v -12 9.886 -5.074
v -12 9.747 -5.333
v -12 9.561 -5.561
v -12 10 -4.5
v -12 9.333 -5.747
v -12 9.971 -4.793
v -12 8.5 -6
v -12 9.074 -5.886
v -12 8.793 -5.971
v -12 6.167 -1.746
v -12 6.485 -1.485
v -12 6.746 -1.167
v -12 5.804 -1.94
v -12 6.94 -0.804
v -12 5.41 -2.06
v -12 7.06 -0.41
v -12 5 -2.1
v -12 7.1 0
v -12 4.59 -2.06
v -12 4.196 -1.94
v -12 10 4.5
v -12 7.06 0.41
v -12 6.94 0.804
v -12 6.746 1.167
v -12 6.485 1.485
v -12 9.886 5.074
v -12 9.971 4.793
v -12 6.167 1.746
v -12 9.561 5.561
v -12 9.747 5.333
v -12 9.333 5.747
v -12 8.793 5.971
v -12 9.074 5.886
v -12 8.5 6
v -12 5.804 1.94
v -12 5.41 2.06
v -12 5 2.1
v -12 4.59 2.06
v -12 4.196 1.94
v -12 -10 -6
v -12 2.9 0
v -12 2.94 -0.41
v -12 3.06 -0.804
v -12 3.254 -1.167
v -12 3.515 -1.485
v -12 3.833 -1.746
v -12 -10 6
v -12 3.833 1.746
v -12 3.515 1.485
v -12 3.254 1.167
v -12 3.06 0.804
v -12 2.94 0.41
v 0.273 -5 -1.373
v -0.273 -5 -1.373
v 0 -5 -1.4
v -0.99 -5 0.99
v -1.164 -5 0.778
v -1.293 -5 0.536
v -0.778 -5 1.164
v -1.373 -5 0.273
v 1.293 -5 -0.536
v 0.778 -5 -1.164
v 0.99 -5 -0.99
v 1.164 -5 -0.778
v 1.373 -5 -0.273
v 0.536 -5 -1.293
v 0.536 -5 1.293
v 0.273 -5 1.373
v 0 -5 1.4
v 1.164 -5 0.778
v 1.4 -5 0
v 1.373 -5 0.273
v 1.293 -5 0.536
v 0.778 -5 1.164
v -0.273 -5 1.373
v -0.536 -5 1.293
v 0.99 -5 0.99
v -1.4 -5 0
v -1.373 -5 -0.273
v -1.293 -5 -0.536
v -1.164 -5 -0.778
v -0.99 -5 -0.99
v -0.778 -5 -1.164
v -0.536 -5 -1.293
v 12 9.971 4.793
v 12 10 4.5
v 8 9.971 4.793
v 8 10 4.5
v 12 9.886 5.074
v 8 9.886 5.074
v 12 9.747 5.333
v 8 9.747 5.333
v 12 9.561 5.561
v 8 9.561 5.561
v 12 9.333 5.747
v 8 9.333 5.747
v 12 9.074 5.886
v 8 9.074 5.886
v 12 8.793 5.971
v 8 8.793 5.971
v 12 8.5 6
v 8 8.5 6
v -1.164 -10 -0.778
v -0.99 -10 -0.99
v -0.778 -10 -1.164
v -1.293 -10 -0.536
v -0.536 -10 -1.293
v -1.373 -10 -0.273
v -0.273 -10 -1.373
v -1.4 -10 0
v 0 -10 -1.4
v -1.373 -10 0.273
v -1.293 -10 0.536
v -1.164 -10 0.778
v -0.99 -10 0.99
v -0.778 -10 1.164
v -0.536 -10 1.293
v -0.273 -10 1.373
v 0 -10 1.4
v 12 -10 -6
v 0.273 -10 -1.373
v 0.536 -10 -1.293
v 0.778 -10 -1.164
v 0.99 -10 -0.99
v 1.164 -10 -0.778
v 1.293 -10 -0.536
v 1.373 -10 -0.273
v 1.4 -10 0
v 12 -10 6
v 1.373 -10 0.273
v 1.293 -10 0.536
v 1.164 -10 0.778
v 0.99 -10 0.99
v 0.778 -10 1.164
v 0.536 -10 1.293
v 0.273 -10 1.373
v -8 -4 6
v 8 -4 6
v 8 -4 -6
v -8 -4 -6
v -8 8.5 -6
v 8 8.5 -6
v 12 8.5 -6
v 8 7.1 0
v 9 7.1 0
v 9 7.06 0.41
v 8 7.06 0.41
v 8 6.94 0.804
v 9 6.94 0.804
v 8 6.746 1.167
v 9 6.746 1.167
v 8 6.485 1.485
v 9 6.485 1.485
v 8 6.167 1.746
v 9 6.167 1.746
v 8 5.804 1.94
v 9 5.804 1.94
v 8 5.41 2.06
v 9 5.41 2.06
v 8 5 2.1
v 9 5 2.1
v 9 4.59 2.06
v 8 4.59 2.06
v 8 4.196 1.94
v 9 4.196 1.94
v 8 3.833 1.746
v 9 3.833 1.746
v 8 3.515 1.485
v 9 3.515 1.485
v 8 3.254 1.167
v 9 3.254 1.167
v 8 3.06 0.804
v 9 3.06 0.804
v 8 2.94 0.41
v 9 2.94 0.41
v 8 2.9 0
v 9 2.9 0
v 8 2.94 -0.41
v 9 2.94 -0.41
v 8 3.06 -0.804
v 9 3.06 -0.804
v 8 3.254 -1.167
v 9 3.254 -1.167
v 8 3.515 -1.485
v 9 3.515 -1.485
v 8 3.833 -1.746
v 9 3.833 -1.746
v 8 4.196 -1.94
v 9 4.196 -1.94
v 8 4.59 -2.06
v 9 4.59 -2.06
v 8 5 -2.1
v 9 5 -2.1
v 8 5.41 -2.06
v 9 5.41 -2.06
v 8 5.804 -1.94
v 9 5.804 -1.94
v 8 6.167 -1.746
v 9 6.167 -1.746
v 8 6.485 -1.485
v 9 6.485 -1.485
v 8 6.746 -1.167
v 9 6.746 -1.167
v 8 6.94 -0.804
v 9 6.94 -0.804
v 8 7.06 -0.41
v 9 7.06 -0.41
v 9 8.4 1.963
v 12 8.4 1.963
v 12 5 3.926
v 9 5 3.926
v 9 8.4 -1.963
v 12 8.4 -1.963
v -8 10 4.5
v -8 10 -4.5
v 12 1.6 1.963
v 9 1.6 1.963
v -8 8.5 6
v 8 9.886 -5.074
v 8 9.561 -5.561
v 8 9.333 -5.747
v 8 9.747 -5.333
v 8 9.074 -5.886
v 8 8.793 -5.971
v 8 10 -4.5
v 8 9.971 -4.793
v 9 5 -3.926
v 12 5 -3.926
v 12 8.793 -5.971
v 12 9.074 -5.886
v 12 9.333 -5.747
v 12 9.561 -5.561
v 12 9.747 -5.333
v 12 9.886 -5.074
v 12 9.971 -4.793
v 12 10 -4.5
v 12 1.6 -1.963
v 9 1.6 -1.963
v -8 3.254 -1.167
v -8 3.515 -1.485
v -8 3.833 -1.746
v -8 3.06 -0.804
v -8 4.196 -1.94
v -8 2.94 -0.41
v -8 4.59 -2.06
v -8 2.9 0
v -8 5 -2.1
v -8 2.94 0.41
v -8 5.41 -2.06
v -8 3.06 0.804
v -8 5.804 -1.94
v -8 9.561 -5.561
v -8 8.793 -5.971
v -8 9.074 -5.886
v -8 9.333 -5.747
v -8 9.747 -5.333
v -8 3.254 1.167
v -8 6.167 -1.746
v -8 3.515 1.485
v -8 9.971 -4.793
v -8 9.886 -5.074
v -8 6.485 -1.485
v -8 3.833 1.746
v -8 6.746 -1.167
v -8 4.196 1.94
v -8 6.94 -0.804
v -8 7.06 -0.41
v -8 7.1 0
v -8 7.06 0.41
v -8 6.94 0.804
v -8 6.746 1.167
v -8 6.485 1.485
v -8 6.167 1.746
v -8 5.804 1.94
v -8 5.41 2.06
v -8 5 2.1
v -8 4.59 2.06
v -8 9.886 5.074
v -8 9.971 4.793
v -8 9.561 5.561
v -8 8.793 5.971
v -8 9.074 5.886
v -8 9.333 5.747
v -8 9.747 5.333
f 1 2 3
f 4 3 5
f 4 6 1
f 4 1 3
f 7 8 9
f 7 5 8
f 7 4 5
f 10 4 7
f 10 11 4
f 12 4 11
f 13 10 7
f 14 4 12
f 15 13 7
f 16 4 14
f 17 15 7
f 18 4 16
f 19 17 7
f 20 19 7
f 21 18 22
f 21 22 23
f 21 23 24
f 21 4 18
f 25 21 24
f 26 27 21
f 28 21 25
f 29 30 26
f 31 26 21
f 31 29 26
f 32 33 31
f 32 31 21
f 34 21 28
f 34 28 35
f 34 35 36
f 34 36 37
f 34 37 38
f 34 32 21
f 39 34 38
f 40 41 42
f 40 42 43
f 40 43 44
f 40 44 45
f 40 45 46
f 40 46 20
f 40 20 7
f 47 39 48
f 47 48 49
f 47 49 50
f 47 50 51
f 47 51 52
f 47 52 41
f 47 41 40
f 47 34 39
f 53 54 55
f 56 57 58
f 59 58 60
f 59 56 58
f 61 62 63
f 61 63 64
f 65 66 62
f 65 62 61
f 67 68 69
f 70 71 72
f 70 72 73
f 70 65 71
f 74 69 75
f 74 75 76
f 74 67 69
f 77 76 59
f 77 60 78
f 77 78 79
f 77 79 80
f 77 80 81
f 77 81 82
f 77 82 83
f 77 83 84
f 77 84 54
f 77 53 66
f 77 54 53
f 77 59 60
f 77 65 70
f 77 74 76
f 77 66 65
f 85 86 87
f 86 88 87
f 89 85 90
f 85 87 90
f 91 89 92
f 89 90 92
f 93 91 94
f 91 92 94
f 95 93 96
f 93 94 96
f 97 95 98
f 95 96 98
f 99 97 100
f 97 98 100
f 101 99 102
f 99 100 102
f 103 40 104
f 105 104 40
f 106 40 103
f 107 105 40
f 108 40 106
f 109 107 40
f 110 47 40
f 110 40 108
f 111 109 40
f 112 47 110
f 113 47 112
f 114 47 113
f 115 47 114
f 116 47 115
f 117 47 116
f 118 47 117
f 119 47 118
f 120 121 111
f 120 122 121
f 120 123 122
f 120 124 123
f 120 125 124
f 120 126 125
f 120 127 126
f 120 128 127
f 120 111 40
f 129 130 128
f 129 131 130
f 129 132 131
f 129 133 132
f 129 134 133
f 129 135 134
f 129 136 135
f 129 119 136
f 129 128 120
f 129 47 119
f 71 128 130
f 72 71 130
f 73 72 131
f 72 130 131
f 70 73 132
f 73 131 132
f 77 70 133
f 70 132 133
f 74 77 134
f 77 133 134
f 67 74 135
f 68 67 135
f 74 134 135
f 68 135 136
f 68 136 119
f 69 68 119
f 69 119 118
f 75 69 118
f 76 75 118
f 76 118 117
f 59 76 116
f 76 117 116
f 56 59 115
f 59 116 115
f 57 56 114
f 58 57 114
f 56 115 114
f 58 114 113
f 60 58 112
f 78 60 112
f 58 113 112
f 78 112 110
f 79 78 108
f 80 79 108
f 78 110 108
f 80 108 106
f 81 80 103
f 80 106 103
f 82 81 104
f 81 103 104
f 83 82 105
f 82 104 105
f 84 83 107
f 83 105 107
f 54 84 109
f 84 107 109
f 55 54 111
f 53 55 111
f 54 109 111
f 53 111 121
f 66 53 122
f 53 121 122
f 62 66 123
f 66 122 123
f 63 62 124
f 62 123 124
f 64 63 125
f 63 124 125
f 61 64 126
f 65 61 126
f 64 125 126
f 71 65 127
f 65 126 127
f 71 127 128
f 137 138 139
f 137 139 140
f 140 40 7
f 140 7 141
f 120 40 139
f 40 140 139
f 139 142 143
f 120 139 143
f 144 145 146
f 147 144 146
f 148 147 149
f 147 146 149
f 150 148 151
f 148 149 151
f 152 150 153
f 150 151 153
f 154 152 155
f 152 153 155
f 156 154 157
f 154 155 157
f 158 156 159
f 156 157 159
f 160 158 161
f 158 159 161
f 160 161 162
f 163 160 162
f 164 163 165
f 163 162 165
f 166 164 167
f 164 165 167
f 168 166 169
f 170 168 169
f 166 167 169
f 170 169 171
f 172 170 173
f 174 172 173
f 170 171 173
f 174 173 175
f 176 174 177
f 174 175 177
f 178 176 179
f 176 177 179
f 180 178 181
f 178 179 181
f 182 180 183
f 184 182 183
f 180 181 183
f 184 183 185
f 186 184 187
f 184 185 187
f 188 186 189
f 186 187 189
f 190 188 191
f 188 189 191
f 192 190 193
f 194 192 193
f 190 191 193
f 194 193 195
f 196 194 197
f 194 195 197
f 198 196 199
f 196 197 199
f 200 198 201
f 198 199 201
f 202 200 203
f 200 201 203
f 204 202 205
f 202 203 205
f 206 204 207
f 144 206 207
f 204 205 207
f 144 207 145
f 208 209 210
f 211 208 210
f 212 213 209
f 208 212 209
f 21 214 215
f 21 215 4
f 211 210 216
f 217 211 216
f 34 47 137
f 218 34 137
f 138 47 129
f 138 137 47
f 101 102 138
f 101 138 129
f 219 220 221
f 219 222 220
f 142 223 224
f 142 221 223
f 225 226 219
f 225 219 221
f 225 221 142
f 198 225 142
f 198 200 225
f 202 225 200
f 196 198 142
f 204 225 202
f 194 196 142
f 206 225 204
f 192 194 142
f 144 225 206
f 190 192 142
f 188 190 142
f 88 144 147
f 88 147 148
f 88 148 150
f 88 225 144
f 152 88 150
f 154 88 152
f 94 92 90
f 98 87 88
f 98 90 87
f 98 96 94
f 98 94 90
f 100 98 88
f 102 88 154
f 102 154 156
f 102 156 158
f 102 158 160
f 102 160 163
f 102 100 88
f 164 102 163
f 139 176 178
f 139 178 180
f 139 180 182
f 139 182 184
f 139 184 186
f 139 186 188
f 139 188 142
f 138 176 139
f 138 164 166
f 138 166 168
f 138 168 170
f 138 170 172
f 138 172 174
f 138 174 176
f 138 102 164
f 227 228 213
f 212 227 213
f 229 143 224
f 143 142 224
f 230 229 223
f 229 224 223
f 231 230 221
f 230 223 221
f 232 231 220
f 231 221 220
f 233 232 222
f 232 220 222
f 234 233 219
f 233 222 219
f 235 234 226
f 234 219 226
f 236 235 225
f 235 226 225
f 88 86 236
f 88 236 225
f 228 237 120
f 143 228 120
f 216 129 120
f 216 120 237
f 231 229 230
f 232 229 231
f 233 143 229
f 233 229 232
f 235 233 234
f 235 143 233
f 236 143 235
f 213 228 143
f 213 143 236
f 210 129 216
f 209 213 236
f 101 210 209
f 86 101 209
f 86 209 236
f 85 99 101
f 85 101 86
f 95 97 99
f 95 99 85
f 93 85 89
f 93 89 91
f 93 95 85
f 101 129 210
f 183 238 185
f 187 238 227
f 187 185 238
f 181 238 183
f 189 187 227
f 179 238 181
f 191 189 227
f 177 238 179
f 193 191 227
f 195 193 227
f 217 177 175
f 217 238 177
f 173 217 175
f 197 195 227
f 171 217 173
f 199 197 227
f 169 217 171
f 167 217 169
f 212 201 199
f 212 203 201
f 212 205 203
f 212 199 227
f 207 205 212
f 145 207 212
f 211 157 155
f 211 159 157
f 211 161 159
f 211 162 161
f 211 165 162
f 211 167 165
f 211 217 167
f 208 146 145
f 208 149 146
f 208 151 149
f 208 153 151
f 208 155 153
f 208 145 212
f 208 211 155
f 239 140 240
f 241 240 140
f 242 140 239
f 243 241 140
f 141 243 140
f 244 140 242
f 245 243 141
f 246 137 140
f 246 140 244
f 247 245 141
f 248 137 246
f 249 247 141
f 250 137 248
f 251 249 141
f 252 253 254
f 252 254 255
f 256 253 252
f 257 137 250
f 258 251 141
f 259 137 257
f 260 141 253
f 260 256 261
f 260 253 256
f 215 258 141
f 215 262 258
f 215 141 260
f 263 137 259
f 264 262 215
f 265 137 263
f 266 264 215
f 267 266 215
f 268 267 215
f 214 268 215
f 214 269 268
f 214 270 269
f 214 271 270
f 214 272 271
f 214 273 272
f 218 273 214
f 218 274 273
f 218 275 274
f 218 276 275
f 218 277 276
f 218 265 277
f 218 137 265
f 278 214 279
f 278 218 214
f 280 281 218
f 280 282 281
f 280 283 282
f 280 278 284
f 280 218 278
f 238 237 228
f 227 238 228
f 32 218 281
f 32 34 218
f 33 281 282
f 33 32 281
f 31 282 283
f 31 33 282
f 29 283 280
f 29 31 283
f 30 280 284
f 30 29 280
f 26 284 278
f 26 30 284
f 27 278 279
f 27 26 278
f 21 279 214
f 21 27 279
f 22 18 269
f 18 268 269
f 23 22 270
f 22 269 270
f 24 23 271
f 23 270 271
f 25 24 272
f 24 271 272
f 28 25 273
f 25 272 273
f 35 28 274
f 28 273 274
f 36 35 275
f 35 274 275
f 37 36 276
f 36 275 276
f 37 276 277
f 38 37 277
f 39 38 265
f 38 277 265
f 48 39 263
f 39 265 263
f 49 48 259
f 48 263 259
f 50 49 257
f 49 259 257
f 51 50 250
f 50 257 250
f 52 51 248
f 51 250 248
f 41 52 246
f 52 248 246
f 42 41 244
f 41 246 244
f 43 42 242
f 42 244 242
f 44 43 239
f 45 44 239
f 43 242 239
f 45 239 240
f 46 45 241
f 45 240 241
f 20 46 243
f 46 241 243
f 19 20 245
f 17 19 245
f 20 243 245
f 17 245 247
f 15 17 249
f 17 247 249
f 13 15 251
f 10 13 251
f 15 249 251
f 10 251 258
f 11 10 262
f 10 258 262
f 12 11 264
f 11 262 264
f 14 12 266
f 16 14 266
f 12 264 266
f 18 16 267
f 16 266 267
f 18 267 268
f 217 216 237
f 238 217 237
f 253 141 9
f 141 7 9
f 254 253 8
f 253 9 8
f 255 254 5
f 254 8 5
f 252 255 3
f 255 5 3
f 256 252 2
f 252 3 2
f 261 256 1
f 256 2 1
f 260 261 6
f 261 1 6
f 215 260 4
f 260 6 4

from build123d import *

# Parameters (mm, degrees)
F1_DEPTH  = 6
F2_R      = 2.1
F3_DEPTH  = 25
F6_DEPTH  = 3
F7_R      = 1.5
F9_R      = 1.4
F10_DEPTH = 5


with BuildPart() as f1:
    # F0 (on Top) → F1 (new body, symmetric)
    with BuildSketch(Plane.XY):
        Polygon((12, -10), (12, 10), (8, 10), (8, -4), (0, -4), (-8, -4), (-8, 10), (-12, 10), (-12, -10), align=None)
    extrude(amount=F1_DEPTH, both=True)

    # F2 (on Right) → F3 (cut, symmetric)
    with BuildSketch(Plane.YZ):
        with Locations((5, 0)):
            Circle(F2_R)
    extrude(amount=F3_DEPTH, both=True, mode=Mode.SUBTRACT)

    # F5 (on offset) → F6 (cut)
    with BuildSketch(Plane.YZ.offset(12)):
        Polygon((5, -3.9259818305), (8.4, -1.9629909152), (8.4, 1.9629909152), (5, 3.9259818305), (1.6, 1.9629909152), (1.6, -1.9629909152), align=None)
    extrude(amount=-F6_DEPTH, mode=Mode.SUBTRACT)

    # F7
    f7_edges = [f1.edges().sort_by_distance(p)[0] for p in [
        (10, 10, -6),
        (10, 10, 6),
        (-10, 10, -6),
        (-10, 10, 6),
    ]]
    fillet(f7_edges, radius=F7_R)

    # F9 (on offset) → F10 (cut)
    with BuildSketch(Plane.XZ.offset(10)):
        Circle(F9_R)
    extrude(amount=-F10_DEPTH, mode=Mode.SUBTRACT)


solid = f1.part
